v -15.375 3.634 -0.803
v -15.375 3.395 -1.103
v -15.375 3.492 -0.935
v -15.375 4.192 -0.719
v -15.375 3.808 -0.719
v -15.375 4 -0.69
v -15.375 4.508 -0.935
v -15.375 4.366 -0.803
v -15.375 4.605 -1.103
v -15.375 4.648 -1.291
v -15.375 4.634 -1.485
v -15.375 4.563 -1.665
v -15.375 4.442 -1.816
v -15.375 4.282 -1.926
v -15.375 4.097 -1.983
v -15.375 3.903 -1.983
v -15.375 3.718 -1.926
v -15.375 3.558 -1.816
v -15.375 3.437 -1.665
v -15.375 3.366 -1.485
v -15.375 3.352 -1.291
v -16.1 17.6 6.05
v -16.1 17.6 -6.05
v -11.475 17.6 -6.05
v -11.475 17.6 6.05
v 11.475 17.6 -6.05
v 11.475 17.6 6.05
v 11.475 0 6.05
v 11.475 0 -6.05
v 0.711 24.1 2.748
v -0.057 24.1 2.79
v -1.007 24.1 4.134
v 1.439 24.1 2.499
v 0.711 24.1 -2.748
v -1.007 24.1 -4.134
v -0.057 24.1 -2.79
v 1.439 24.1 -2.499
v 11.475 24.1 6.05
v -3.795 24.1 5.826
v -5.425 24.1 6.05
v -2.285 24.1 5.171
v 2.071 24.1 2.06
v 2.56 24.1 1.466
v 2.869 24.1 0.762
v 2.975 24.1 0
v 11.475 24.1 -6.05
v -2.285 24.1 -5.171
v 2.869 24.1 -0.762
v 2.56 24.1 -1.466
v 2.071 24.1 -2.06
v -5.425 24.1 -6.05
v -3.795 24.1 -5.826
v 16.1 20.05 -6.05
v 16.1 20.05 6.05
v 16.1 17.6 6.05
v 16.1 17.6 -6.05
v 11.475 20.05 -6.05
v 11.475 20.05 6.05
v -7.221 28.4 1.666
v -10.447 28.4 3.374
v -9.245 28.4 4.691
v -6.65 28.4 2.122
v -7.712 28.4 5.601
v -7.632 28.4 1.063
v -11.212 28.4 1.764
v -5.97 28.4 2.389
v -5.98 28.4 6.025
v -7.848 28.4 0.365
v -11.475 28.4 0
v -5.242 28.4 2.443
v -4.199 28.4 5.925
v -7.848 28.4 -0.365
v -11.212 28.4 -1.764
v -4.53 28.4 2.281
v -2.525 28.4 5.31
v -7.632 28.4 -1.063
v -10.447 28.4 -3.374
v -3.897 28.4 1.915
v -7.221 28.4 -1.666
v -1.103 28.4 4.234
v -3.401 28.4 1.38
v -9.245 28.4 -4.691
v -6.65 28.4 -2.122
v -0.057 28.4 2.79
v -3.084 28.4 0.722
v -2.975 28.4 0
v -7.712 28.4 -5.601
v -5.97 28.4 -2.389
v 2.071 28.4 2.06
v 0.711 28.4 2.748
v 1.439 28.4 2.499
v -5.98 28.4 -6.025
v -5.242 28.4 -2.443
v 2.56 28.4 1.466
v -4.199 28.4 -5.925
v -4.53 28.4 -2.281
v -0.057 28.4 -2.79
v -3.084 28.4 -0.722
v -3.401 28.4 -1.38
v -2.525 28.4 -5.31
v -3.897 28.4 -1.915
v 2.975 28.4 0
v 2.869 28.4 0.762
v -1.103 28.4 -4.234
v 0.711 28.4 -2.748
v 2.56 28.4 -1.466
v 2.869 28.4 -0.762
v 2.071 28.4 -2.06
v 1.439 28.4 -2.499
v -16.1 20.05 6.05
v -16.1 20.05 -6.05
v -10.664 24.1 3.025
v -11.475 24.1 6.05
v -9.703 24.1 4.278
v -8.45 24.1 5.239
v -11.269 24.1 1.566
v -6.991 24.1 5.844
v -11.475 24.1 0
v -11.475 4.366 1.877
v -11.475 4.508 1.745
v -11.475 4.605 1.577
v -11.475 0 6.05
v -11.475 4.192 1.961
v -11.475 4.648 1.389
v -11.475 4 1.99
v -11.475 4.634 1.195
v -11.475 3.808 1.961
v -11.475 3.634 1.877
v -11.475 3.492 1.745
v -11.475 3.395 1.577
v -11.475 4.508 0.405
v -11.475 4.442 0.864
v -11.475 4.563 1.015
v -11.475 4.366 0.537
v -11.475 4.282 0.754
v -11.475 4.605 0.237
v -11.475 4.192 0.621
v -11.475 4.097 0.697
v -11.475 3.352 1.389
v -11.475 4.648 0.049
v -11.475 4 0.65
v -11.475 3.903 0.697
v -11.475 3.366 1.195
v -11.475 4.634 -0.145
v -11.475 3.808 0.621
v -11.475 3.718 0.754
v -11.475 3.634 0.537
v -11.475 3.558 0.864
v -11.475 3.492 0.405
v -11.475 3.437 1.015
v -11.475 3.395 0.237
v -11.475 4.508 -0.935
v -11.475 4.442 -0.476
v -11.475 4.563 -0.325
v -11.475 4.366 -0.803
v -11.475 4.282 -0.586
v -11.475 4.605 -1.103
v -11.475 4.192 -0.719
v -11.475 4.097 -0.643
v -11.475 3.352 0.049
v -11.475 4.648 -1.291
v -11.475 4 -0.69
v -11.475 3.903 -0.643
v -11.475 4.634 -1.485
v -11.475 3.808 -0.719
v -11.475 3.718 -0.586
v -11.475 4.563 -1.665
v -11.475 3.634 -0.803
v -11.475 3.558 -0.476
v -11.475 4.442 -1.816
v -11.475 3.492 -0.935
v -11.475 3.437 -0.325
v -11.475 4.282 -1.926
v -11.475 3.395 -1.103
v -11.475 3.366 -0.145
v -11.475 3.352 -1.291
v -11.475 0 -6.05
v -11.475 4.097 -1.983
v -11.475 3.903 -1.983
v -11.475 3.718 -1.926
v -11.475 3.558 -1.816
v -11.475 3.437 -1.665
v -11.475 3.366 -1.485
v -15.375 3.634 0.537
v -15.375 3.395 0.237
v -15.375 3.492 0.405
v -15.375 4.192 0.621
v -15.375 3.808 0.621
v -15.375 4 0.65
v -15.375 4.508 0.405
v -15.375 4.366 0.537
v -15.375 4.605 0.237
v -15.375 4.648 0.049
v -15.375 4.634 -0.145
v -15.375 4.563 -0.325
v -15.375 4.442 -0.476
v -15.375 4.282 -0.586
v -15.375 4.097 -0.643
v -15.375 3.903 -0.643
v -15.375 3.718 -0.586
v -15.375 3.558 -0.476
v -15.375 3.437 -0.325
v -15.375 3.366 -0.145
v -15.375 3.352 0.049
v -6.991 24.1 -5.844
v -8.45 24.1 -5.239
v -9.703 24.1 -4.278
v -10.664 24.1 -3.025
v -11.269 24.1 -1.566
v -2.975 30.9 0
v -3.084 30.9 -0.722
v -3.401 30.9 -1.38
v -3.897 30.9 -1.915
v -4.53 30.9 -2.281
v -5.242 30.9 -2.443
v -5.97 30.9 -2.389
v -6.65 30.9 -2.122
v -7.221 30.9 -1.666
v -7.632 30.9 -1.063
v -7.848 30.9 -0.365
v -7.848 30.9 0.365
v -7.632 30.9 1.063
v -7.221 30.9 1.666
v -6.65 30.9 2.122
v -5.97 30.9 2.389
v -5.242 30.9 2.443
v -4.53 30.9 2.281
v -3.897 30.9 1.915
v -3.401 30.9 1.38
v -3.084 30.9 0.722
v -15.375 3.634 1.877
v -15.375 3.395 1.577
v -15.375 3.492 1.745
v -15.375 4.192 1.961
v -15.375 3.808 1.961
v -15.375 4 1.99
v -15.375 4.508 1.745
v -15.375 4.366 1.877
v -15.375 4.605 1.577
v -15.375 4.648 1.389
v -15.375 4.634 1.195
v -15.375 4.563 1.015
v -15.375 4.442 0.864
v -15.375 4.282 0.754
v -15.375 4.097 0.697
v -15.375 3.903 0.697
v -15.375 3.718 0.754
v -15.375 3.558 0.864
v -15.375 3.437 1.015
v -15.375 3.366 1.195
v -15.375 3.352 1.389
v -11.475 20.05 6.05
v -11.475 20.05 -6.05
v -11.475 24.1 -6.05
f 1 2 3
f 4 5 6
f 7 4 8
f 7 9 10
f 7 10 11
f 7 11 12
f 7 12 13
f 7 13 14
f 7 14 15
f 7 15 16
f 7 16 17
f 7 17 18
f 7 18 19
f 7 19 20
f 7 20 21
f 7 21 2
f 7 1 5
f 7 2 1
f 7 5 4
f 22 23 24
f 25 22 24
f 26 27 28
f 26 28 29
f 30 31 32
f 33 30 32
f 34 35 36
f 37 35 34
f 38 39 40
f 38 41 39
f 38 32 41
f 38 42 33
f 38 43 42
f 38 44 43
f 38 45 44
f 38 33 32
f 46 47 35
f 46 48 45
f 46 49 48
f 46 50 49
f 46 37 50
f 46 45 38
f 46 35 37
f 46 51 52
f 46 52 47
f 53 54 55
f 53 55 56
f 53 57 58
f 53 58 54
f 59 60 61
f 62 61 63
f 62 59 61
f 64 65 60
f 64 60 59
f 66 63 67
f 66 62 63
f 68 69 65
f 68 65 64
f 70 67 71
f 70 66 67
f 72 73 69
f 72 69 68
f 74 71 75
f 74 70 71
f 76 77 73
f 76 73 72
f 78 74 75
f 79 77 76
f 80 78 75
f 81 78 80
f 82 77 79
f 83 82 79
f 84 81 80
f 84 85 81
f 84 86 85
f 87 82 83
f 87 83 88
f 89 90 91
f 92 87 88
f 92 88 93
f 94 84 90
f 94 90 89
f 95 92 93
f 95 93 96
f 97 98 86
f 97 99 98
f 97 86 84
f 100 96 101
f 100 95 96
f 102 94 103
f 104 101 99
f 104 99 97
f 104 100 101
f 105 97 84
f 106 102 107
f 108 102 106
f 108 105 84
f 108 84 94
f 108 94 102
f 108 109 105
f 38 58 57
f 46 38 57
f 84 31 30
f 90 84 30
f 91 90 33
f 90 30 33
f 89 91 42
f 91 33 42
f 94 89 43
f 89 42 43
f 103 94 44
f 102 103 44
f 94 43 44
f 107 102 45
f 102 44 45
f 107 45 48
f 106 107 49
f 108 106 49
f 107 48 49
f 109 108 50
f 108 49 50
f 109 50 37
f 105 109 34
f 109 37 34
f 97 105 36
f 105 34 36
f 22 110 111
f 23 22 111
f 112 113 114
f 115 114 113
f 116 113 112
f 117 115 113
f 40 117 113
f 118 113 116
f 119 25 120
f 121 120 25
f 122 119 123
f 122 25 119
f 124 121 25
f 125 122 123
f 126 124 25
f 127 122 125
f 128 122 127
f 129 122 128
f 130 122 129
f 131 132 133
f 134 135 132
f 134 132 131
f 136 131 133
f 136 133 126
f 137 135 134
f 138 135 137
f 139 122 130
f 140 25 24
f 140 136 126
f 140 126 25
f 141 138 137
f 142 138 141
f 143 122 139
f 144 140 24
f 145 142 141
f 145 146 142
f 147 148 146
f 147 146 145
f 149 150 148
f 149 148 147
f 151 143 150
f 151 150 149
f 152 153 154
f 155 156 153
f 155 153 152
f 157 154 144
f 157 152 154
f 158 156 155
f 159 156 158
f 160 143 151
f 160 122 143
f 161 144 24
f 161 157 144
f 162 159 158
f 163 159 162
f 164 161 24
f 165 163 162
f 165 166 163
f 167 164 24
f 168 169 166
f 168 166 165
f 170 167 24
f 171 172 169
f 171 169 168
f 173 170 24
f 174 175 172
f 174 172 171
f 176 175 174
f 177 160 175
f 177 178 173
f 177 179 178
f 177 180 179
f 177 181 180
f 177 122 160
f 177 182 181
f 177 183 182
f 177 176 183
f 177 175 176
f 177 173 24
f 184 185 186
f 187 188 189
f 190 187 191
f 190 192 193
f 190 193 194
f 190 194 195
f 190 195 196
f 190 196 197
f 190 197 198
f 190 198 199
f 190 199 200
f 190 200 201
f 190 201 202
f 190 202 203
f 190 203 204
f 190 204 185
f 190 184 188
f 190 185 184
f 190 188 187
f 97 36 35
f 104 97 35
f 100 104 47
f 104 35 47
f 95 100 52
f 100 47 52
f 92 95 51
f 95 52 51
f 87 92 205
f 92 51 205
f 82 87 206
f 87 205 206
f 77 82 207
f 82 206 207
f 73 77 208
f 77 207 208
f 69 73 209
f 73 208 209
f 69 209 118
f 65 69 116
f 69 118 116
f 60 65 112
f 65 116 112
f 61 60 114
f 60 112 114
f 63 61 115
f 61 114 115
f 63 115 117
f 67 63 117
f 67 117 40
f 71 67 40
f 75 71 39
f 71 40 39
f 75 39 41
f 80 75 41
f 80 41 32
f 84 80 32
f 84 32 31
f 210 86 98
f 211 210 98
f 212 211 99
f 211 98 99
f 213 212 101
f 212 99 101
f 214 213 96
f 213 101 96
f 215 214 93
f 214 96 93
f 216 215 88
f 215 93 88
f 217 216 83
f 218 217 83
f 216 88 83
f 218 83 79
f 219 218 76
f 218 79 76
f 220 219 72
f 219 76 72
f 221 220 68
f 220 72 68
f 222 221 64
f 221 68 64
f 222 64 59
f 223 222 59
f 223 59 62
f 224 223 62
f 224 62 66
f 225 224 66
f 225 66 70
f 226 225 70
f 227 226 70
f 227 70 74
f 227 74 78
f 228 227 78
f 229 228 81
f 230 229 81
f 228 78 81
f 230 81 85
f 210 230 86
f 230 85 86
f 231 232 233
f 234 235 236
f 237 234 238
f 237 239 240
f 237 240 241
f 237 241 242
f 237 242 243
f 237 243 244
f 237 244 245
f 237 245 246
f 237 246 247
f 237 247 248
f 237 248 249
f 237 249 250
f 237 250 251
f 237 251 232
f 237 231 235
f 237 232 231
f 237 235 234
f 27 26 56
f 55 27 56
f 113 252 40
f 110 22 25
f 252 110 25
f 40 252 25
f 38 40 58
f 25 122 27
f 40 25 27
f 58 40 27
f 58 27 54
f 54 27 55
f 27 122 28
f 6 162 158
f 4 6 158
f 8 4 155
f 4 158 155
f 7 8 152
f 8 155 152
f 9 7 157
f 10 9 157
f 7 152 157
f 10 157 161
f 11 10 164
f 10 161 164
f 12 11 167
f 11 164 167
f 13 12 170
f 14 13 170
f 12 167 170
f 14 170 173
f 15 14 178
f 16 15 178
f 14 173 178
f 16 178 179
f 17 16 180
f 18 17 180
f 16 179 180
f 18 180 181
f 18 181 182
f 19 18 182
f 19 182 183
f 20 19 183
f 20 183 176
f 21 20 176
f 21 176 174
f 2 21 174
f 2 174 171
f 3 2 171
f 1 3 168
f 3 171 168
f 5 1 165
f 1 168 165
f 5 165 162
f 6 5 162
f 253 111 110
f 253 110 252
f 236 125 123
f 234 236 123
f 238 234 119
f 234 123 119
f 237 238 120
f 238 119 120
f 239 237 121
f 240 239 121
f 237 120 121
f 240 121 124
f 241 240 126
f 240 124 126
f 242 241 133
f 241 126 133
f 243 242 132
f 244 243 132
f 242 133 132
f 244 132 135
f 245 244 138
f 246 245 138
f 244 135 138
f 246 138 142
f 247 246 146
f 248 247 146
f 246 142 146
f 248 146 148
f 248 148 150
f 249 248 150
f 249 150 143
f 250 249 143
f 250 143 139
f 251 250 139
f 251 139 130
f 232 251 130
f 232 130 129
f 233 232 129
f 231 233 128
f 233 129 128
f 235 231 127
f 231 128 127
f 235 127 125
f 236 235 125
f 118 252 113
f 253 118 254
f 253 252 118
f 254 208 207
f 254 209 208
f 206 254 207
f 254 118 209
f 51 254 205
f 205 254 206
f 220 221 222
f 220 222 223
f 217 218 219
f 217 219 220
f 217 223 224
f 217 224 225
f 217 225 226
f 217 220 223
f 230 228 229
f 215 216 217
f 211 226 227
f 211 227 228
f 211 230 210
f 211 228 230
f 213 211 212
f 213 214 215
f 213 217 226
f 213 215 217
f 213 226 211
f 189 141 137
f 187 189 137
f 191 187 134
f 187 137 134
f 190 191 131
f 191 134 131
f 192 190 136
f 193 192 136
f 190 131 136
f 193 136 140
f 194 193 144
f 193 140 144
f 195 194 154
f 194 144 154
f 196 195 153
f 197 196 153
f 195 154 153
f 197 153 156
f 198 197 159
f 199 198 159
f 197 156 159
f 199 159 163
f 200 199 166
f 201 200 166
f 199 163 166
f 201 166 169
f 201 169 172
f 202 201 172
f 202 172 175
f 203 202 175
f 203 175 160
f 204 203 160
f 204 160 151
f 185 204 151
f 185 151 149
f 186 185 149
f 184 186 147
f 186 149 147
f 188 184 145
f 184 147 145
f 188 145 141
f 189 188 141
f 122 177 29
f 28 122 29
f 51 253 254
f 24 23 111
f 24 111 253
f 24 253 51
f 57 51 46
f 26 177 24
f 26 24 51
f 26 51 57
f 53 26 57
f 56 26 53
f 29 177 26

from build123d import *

# Parameters (mm, degrees)
SKETCH1_W           = 22.95
SKETCH1_H           = 12.1
BOSS_EXTRUDE1_DEPTH = 24.1
BOSS_EXTRUDE2_DEPTH = 4.3
SKETCH3_W           = 4.625
SKETCH3_H           = 12.1
BOSS_EXTRUDE3_DEPTH = 2.45
SKETCH4_R           = 2.45
BOSS_EXTRUDE4_DEPTH = 2.5
SKETCH5_R           = 0.65
BOSS_EXTRUDE7_DEPTH = 3.9


with BuildPart() as part:
    # Sketch1 → Boss-Extrude1 (new body)
    with BuildSketch(Plane(origin=(0, 0, 0), x_dir=(1, 0, 0), z_dir=(0, 1, 0))):
        Rectangle(SKETCH1_W, SKETCH1_H)
    extrude(amount=BOSS_EXTRUDE1_DEPTH)

    # Sketch2 → Boss-Extrude2 (add)
    with BuildSketch(Plane(origin=(0, 24.1, 0), x_dir=(1, 0, 0), z_dir=(0, 1, 0))):
        with BuildLine():
            ThreePointArc((-0.056919643, 2.790378698), (-11.475, 0), (-0.056919643, -2.790378698))
            ThreePointArc((-0.056919643, -2.790378698), (2.975, 0), (-0.056919643, 2.790378698))
        make_face()
    extrude(amount=BOSS_EXTRUDE2_DEPTH)

    # Sketch3 → Boss-Extrude3 (add)
    with BuildSketch(Plane(origin=(0, 20.05, 0), x_dir=(1, 0, 0), z_dir=(0, 1, 0))):
        with Locations((-13.7875, 0)):
            Rectangle(SKETCH3_W, SKETCH3_H)
        with Locations((13.7875, 0)):
            Rectangle(SKETCH3_W, SKETCH3_H)
    extrude(amount=-BOSS_EXTRUDE3_DEPTH)

    # Sketch4 → Boss-Extrude4 (add)
    with BuildSketch(Plane(origin=(0, 28.4, 0), x_dir=(1, 0, 0), z_dir=(0, 1, 0))):
        with Locations((-5.425, 0)):
            Circle(SKETCH4_R)
    extrude(amount=BOSS_EXTRUDE4_DEPTH)

    # Sketch5 → Boss-Extrude7 (add)
    with BuildSketch(Plane.ZY.offset(11.475)):
        with Locations((0, 4)):
            Circle(SKETCH5_R)
        with Locations((1.34, 4)):
            Circle(SKETCH5_R)
        with Locations((-1.34, 4)):
            Circle(SKETCH5_R)
    extrude(amount=BOSS_EXTRUDE7_DEPTH)


solid = part.part
